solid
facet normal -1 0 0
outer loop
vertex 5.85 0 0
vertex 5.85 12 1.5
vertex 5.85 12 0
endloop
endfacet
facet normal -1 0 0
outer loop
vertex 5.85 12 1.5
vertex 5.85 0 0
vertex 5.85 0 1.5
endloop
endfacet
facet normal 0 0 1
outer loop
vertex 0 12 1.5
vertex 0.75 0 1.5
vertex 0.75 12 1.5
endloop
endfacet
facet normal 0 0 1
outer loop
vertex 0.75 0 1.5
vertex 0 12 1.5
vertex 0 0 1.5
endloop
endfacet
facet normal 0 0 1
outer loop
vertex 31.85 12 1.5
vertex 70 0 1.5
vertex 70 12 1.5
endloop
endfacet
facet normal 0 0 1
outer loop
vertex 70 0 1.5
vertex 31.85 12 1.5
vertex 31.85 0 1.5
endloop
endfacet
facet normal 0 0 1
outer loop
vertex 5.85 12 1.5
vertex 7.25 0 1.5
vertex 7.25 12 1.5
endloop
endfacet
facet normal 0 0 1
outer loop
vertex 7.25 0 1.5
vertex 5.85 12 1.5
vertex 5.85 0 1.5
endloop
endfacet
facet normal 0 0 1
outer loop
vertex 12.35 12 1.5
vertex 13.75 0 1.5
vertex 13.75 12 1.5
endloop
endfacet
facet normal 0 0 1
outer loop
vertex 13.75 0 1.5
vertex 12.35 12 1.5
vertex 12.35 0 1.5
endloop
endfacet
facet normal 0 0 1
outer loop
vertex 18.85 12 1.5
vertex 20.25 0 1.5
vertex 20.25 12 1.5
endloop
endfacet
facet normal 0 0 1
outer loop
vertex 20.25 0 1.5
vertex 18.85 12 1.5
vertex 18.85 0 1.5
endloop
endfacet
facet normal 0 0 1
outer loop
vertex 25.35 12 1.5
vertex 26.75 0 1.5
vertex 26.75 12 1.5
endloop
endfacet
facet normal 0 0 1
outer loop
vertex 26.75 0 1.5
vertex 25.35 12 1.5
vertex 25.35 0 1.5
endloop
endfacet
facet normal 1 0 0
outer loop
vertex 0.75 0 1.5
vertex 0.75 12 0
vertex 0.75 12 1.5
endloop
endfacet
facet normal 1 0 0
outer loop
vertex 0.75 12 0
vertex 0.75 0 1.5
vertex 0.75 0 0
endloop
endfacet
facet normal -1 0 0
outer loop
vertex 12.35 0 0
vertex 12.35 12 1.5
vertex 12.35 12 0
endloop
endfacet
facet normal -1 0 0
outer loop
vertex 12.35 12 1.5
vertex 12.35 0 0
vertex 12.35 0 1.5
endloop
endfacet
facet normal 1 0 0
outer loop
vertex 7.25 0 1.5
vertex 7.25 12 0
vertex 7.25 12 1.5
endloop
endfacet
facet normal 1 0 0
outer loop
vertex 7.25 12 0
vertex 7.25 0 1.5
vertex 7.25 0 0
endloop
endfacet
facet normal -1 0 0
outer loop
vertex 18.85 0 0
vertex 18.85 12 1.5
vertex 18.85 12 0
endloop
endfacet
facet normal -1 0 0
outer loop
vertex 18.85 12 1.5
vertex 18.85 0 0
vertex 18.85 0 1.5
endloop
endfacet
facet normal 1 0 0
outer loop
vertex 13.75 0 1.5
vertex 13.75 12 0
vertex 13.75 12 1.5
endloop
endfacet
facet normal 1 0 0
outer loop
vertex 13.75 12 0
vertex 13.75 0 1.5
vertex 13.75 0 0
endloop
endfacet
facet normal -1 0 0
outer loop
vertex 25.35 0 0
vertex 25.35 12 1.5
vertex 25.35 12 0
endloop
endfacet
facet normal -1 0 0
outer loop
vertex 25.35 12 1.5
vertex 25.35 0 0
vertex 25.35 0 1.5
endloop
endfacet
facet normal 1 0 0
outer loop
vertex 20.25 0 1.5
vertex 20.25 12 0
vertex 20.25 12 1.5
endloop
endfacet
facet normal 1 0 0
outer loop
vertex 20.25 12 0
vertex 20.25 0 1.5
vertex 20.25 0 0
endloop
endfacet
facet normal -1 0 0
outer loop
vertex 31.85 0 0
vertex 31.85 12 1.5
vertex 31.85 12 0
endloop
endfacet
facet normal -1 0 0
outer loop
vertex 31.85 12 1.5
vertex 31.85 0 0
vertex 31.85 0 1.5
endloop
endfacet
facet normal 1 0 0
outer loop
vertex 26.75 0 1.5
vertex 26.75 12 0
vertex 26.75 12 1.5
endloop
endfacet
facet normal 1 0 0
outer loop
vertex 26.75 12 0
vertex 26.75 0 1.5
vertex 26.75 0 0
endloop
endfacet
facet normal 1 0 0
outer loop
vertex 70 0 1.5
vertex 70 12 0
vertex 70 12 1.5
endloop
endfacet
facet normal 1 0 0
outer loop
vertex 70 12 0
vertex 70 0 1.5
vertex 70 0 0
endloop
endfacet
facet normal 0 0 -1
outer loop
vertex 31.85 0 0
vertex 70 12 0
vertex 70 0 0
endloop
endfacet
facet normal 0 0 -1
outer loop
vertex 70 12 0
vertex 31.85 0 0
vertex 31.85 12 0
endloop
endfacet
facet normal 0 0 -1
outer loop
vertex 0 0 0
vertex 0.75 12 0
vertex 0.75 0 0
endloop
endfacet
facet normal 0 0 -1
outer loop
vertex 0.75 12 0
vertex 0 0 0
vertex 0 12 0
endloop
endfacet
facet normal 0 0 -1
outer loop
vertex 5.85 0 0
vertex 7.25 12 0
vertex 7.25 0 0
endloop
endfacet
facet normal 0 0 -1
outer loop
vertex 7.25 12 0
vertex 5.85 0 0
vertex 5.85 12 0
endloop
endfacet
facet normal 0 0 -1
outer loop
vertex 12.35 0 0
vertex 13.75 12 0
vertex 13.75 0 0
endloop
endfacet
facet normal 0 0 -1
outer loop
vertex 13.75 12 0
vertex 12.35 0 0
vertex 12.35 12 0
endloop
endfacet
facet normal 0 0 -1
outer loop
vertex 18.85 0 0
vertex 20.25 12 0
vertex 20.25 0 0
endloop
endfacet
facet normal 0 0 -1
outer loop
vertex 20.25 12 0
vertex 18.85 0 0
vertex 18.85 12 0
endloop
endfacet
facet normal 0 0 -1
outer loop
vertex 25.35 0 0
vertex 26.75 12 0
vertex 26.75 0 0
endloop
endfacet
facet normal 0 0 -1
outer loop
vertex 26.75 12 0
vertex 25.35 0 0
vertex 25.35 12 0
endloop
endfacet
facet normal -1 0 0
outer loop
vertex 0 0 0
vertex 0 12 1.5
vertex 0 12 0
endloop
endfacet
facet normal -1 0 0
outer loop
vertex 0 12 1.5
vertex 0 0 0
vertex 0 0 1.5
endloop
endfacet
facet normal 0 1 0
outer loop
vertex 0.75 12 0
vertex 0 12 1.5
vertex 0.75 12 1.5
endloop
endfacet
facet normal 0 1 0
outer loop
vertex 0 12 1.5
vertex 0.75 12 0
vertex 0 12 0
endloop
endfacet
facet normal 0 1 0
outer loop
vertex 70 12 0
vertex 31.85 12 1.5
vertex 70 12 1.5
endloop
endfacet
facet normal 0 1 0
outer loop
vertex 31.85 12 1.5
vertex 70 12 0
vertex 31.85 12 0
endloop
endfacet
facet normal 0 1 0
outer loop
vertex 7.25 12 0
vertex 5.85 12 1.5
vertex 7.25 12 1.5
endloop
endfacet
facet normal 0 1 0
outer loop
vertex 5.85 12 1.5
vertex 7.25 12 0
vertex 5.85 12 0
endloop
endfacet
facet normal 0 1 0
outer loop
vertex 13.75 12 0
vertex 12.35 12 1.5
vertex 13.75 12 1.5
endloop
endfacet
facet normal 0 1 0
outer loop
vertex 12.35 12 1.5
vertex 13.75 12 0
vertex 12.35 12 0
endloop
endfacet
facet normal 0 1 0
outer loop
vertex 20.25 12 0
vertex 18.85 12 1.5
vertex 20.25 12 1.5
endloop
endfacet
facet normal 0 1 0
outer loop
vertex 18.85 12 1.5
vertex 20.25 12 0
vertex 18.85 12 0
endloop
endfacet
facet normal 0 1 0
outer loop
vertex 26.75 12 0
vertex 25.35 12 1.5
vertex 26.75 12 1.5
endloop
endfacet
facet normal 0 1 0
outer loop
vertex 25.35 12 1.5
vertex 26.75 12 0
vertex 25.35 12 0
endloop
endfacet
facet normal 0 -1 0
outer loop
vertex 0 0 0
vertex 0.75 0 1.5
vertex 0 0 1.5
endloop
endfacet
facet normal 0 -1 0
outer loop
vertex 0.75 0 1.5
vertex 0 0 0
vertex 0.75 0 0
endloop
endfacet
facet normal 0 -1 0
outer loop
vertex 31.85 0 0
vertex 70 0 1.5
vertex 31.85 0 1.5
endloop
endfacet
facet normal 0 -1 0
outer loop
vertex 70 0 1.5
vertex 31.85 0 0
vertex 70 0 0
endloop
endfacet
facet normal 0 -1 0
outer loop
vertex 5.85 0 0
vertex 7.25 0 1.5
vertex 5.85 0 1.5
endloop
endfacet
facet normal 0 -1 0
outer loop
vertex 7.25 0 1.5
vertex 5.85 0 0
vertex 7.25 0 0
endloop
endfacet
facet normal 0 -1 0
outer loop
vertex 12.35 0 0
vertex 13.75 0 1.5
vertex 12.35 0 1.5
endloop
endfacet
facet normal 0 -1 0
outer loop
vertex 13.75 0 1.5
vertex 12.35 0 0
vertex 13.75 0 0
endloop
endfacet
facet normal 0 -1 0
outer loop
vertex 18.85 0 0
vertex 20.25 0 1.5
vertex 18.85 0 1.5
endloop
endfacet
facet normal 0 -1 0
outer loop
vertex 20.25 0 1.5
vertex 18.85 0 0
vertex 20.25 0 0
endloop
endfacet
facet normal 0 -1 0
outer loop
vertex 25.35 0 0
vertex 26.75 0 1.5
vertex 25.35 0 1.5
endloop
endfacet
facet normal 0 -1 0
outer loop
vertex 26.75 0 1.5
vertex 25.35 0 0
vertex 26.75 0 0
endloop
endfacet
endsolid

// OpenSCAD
// OpenSCAD code for a 10-well agarose gel comb

// --- Dimensions ---
spine_length = 70;      // Total length of the spine (X dimension)
spine_width = 12;       // Width of the spine (Y dimension)
comb_thickness = 1.5;   // Thickness of the entire plate (Z dimension)

tooth_width = 5.0;      // Width of each tooth (X dimension)
tooth_length = 12.0;    // Length/depth of each tooth (Y dimension, extending into gel)
gap_size = 1.5;         // Gap size between teeth

num_teeth = 10;         // Number of wells/teeth

// --- Constants ---
$fn = 64; // High resolution for curves

// --- Geometry Calculations ---

// Total width occupied by teeth and gaps along the X-axis (for centering)
total_tooth_span = num_teeth * tooth_width + (num_teeth - 1) * gap_size;

// Calculate the starting X position to center the row of teeth on the spine's length (70mm)
// The comb is centered in X, so we need to place the entire structure around X=0.
// Since the spine is 70mm long and centered at origin, it spans from -35 to 35.
// We will center the teeth row along the spine's length (X-axis).

// The total span of the teeth array needs to be centered on the X=0 line.
start_x_teeth = -(total_tooth_span / 2);


// --- Main Assembly ---

module gel_comb() {
    difference() {
        // 1. Base Plate (The solid body)
        cube([spine_length, spine_width, comb_thickness]);

        // 2. Cutting the teeth slots (using difference to create holes/slots)
        for (i = [0 : num_teeth - 1]) {
            // Calculate the X position for the current tooth center
            current_tooth_x = start_x_teeth + i * (tooth_width + gap_size);

            // The teeth are cut from one long edge of the spine.
            // We assume the spine is centered at Y=0, spanning from -spine_width/2 to spine_width/2.
            // Let's assume the cutting happens along the positive Y edge (Y = spine_width / 2).

            // The cutter must be slightly larger than the tooth dimensions to ensure clean separation.
            cutter_x = tooth_width + 0.1; // Slightly wider cut
            cutter_y = tooth_length + 0.1; // Slightly deeper cut (must extend past the base plate)
            cutter_z = comb_thickness + 1.0; // Ensure it cuts all the way through

            translate([current_tooth_x, spine_width/2 - cutter_y/2, -0.01]) {
                // The tooth slot is a rectangular prism cut into the base plate
                cube([cutter_x, cutter_y, comb_thickness + 0.01]);
            }
        }
    }
}

gel_comb();
